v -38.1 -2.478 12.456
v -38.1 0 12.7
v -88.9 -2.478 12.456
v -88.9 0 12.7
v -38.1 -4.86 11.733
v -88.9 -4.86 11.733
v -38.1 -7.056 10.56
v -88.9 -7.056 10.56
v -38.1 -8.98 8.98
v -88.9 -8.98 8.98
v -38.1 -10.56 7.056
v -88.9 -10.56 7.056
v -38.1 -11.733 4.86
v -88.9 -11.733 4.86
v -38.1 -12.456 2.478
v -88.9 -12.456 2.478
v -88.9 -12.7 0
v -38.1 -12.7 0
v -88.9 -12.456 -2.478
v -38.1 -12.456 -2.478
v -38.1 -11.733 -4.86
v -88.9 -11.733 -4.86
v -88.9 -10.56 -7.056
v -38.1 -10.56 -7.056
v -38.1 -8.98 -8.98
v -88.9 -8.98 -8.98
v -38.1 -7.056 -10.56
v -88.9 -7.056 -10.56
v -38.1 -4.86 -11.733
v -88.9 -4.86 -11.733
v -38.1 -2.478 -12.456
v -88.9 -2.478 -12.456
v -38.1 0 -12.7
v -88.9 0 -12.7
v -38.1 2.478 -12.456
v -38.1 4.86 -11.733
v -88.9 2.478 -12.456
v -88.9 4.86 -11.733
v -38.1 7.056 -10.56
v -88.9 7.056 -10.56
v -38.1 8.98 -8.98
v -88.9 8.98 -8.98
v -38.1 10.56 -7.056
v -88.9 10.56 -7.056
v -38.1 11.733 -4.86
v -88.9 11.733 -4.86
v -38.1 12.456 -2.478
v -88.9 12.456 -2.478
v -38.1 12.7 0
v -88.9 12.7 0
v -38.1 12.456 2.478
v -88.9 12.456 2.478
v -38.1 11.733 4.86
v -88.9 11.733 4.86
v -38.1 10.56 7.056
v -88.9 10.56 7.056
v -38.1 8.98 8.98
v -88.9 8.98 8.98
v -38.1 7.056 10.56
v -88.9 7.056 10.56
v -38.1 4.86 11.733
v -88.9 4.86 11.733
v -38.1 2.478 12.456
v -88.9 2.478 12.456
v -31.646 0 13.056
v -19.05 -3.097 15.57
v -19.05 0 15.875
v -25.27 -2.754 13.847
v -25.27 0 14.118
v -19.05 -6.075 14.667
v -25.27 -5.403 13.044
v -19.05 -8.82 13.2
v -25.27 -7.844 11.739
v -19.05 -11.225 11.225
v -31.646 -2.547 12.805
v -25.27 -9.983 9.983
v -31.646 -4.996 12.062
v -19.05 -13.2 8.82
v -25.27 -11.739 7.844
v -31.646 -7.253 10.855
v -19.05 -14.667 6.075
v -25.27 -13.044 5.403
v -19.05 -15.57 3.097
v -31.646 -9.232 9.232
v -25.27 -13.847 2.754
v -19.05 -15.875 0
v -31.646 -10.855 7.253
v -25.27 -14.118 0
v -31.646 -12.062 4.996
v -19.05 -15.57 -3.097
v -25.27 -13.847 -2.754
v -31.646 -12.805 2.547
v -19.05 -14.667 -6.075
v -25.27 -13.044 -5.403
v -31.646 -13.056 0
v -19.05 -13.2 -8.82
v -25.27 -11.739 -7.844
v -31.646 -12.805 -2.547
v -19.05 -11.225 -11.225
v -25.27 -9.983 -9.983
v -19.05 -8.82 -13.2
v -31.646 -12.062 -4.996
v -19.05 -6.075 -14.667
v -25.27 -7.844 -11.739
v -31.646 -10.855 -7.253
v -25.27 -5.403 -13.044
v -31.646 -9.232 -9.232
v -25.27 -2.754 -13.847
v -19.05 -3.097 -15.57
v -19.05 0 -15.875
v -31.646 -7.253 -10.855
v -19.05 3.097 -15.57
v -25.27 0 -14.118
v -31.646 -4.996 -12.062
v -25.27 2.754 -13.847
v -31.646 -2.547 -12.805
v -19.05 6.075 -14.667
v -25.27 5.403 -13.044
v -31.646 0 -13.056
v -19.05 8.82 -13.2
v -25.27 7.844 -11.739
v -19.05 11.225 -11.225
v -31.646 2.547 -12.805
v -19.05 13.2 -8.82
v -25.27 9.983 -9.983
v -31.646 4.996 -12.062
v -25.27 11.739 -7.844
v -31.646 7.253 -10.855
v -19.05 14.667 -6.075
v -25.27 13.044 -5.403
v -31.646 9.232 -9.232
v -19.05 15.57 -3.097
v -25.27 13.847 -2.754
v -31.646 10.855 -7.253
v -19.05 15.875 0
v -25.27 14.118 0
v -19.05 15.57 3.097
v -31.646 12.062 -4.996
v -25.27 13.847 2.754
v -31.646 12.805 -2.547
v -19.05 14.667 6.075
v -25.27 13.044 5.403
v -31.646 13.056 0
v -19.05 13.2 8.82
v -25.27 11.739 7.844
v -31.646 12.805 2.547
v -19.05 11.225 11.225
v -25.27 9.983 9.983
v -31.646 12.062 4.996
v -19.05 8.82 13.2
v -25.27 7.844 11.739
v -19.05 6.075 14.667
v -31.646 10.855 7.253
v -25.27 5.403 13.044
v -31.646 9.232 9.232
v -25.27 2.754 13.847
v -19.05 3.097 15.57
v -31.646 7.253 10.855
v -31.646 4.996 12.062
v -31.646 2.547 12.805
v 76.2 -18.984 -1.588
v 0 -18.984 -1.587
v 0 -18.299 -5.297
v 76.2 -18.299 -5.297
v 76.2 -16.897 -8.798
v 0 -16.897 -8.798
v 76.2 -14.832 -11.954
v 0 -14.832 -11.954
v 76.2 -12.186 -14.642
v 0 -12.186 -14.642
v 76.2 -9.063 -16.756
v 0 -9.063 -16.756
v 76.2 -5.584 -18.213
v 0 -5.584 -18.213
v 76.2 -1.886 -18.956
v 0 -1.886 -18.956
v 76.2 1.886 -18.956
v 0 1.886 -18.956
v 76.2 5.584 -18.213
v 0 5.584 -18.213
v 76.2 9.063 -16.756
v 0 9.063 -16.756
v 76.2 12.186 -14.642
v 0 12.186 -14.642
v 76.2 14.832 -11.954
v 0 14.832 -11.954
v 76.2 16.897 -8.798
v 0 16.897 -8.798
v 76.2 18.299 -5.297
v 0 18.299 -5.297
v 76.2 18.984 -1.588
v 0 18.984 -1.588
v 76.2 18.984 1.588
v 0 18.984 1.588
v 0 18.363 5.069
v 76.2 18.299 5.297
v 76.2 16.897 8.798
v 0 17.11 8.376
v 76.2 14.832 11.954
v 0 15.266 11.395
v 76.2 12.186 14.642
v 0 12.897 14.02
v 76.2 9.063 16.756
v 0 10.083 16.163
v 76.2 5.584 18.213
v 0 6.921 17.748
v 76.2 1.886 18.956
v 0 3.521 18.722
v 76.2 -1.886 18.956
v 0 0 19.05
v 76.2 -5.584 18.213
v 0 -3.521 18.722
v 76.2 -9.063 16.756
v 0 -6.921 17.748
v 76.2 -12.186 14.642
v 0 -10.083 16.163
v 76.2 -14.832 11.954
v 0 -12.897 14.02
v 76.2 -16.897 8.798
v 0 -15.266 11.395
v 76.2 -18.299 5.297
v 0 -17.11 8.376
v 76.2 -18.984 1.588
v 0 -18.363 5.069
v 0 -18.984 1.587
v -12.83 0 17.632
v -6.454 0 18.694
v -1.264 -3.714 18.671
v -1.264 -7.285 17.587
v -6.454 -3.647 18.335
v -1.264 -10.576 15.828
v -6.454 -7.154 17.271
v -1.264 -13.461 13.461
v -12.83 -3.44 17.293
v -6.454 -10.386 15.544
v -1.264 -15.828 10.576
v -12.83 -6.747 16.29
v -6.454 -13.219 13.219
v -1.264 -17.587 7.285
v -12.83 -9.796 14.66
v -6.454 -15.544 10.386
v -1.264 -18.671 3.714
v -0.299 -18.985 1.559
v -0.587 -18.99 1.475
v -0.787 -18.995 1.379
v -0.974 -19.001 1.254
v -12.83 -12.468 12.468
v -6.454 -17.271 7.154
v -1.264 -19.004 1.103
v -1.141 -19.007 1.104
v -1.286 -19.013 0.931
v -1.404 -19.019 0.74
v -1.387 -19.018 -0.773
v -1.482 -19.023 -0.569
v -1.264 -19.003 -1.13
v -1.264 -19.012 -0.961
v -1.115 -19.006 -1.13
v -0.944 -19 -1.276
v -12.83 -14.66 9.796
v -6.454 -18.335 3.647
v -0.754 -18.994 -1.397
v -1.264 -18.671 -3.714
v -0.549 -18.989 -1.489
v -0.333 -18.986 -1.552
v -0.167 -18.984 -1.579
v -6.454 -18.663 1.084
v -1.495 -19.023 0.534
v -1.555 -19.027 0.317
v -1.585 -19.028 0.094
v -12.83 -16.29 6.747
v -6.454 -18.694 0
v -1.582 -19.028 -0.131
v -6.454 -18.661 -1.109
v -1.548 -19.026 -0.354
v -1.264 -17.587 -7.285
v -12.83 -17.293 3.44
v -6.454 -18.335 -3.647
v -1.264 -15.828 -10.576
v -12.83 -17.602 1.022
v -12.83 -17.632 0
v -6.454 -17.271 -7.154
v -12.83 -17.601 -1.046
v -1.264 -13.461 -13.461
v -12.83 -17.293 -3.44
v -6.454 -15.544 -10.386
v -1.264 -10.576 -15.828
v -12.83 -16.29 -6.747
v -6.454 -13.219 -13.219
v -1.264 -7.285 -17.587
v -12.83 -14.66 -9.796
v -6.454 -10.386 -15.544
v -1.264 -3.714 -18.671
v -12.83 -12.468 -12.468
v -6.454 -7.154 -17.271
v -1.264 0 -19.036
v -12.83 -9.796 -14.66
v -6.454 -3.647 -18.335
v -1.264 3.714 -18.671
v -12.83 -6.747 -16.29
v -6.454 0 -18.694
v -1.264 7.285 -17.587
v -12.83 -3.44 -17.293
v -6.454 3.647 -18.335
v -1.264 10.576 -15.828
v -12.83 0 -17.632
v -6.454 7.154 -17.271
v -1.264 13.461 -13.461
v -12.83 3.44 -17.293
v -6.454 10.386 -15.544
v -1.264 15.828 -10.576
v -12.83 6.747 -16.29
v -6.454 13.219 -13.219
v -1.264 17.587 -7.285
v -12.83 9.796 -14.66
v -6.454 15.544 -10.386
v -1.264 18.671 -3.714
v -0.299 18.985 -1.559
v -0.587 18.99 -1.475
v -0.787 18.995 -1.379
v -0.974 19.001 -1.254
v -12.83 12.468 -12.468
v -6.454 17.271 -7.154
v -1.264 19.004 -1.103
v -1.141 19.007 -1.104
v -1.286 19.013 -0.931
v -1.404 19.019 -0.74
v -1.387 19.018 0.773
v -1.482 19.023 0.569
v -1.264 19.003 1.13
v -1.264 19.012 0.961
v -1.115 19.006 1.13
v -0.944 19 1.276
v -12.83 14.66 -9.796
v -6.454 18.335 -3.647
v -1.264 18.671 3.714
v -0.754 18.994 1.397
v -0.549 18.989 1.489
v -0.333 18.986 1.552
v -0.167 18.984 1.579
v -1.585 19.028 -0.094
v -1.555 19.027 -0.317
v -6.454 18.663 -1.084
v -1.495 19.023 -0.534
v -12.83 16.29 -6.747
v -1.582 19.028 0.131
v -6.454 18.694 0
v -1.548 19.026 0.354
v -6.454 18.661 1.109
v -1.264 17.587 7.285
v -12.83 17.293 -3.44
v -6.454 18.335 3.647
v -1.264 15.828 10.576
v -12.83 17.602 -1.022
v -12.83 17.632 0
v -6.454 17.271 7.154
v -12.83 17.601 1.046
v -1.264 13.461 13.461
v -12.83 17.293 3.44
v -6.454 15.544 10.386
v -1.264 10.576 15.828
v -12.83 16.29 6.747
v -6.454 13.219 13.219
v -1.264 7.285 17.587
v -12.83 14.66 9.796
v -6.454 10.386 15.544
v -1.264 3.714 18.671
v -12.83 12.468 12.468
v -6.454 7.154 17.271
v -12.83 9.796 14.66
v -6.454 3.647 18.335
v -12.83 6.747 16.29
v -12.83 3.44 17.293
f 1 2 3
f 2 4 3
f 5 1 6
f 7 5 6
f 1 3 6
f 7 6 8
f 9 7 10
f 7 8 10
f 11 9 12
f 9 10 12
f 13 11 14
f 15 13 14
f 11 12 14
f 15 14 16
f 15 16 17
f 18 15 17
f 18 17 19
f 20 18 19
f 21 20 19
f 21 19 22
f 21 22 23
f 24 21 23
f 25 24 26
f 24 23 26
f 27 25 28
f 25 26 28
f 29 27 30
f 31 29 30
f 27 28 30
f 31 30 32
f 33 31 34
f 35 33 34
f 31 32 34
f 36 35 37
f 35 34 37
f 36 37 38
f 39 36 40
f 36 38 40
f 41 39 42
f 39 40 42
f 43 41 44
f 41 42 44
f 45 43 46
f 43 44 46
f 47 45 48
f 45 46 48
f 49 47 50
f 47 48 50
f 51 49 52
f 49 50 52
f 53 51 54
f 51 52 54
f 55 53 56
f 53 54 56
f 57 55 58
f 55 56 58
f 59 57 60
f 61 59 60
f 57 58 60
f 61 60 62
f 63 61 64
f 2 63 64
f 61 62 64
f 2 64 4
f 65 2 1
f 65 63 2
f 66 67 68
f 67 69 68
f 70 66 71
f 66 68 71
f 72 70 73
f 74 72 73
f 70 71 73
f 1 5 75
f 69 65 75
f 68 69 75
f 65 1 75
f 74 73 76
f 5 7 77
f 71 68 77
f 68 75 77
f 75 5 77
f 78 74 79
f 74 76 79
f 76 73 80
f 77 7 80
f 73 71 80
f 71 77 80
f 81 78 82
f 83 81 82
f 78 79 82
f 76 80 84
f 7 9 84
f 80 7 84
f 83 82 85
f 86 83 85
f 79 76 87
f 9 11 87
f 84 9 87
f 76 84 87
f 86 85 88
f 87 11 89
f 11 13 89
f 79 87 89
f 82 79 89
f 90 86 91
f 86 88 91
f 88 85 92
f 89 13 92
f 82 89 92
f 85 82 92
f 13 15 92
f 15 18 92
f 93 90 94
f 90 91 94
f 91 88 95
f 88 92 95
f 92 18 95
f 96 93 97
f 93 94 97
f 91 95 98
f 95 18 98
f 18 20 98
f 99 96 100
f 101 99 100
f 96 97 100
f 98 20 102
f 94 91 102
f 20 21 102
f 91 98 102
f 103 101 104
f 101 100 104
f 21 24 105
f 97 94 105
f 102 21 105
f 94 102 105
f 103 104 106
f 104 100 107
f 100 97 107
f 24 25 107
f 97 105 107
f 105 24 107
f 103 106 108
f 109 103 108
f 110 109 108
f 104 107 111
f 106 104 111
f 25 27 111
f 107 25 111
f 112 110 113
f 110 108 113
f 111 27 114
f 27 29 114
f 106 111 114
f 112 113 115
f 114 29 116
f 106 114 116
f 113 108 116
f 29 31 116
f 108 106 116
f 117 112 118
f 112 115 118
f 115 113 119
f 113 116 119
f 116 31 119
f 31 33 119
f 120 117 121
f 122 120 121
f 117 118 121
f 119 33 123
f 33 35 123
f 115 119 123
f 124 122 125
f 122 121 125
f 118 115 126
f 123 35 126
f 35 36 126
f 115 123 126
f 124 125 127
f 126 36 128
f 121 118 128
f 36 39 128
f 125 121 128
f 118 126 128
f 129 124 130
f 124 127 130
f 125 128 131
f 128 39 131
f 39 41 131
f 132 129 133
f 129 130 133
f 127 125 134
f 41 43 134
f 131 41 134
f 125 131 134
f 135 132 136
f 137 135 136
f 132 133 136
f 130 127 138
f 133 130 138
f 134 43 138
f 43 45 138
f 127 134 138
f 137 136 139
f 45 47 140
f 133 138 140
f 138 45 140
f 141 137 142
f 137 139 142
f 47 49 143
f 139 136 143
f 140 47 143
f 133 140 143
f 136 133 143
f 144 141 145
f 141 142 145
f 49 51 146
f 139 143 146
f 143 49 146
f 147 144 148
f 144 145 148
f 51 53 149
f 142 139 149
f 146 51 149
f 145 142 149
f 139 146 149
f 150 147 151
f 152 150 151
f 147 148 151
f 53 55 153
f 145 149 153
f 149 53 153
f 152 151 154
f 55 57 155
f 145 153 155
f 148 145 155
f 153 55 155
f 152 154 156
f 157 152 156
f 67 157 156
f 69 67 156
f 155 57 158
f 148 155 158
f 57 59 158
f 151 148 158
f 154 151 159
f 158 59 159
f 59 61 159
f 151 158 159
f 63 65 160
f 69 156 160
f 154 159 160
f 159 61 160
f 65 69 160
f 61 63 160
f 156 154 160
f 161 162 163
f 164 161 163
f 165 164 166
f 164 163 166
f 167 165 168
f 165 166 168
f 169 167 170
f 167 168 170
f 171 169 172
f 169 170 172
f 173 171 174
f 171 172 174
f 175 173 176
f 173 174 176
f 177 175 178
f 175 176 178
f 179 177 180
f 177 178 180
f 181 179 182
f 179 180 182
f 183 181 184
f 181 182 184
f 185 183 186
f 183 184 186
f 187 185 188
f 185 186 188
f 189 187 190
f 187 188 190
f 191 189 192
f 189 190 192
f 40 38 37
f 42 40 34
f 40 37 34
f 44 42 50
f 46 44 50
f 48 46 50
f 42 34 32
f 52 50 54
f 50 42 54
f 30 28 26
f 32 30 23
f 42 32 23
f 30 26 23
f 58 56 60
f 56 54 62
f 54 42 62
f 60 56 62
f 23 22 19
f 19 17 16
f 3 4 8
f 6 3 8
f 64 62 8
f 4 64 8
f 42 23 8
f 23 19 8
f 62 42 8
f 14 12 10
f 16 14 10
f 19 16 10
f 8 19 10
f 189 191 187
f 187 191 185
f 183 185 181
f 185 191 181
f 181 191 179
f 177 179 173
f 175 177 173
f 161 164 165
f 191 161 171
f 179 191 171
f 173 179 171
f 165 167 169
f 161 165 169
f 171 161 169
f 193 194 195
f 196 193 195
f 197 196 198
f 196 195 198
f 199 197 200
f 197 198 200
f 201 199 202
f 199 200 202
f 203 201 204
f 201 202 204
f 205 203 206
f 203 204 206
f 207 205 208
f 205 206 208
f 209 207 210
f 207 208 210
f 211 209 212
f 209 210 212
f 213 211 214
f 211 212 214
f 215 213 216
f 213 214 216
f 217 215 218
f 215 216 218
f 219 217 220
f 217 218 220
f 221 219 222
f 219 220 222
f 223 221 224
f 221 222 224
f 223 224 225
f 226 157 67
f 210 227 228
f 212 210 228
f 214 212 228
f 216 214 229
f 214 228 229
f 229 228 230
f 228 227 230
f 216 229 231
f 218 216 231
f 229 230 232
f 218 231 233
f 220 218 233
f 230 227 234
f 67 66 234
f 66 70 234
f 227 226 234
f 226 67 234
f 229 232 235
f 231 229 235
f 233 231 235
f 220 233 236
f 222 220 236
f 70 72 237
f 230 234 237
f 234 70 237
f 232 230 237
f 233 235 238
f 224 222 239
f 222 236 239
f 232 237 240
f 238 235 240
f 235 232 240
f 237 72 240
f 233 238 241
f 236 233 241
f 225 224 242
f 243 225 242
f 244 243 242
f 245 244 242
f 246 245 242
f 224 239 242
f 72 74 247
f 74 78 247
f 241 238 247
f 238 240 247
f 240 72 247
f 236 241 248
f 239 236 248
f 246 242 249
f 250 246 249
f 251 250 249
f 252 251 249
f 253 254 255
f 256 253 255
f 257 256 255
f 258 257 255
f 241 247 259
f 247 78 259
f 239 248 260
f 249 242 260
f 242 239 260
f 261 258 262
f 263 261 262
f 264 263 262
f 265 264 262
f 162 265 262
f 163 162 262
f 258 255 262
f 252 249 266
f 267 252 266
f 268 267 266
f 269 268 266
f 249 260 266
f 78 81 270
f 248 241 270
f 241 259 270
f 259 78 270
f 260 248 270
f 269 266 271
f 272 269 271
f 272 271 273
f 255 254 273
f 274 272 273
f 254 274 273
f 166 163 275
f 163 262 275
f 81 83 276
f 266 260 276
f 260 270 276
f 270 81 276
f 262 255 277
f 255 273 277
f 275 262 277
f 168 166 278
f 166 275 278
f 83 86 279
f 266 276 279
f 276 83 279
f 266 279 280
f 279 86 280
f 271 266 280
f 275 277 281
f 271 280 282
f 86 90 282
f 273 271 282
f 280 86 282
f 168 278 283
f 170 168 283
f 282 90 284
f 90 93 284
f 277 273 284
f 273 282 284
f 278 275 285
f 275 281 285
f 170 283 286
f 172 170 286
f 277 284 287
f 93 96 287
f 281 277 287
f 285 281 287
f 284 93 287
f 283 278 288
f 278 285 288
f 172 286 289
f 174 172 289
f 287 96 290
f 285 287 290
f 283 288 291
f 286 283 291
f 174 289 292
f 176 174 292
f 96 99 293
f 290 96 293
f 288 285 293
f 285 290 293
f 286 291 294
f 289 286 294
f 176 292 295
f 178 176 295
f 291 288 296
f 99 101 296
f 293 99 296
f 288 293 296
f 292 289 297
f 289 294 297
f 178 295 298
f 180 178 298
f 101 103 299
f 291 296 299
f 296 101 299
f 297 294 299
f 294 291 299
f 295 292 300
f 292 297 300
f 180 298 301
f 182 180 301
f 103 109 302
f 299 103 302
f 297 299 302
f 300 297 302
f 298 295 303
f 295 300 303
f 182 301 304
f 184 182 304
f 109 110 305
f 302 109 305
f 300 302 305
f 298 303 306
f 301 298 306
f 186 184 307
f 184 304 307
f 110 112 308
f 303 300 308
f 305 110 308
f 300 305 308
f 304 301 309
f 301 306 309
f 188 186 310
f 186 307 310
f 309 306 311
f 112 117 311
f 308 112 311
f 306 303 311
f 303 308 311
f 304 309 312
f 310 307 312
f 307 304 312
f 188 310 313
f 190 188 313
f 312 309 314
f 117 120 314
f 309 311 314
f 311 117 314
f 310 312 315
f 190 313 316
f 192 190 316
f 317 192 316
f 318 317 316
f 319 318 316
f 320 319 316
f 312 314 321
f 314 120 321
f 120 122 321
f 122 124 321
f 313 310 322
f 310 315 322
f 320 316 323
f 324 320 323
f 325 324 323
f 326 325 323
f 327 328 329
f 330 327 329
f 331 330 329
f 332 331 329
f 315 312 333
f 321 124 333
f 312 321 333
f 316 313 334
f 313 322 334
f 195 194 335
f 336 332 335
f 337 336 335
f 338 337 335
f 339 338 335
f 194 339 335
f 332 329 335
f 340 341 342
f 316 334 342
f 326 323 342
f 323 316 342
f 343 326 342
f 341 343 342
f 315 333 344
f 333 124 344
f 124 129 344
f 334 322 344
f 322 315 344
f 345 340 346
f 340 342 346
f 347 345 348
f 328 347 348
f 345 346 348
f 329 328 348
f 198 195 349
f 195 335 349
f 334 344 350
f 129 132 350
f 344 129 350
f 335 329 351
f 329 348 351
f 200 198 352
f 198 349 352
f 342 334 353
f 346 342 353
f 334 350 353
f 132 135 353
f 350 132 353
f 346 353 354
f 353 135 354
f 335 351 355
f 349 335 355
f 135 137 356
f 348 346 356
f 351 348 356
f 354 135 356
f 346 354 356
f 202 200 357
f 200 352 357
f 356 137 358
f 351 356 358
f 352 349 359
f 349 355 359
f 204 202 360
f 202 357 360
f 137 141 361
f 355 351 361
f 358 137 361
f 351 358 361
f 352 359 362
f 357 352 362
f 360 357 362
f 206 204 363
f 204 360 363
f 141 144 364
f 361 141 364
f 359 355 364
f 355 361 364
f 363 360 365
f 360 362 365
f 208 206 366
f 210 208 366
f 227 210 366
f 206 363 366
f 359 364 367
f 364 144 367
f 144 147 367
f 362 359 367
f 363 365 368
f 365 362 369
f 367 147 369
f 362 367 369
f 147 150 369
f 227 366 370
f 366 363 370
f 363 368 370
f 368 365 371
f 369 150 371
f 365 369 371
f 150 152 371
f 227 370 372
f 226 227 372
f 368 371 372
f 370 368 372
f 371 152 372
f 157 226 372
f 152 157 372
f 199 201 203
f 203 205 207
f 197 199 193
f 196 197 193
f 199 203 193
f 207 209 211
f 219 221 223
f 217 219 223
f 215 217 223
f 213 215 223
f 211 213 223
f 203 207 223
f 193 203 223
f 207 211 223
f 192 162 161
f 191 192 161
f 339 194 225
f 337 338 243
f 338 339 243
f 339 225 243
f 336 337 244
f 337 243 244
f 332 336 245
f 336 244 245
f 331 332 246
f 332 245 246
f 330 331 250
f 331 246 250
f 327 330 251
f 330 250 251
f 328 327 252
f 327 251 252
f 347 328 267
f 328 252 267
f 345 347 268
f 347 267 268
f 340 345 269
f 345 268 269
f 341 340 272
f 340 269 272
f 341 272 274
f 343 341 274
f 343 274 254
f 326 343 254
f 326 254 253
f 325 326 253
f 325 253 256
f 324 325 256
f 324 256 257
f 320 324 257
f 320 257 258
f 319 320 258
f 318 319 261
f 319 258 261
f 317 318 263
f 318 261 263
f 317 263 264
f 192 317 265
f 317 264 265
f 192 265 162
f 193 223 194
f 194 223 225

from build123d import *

# Parameters (mm, degrees)
F3_DEPTH      = 19.0510001
F3_DEPTH_BACK = 19.0510001


with BuildPart() as f1:
    # F0 (on Front) → F1 (revolve)
    with BuildSketch(Plane.XZ):
        with BuildLine():
            Line((-38.1, 12.7), (-88.9, 12.7))
            Line((-88.9, 12.7), (-88.9, 0))
            Line((-88.9, 0), (76.2, 0))
            Line((76.2, 0), (76.2, 19.05))
            Line((76.2, 19.05), (0, 19.05))
            ThreePointArc((0, 19.05), (-9.6563855168, 18.2508131011), (-19.05, 15.875))
            ThreePointArc((-19.05, 15.875), (-28.4436144832, 13.4991868989), (-38.1, 12.7))
        make_face()
    revolve(axis=Axis((-6.35, 0, 0), (1, 0, 0)))

    # F2 (on Front) → F3 (cut, two sides)
    with BuildSketch(Plane.XZ) as f3_sk:
        with BuildLine():
            Line((76.2, -1.5875), (76.2, 1.5875))
            Line((76.2, 1.5875), (0, 1.5875))
            ThreePointArc((0, 1.5875), (-1.5875, 0), (0, -1.5875))
            Line((0, -1.5875), (76.2, -1.5875))
        make_face()
    extrude(amount=-F3_DEPTH, mode=Mode.SUBTRACT)
    extrude(f3_sk.sketch, amount=F3_DEPTH_BACK, mode=Mode.SUBTRACT)


solid = f1.part
